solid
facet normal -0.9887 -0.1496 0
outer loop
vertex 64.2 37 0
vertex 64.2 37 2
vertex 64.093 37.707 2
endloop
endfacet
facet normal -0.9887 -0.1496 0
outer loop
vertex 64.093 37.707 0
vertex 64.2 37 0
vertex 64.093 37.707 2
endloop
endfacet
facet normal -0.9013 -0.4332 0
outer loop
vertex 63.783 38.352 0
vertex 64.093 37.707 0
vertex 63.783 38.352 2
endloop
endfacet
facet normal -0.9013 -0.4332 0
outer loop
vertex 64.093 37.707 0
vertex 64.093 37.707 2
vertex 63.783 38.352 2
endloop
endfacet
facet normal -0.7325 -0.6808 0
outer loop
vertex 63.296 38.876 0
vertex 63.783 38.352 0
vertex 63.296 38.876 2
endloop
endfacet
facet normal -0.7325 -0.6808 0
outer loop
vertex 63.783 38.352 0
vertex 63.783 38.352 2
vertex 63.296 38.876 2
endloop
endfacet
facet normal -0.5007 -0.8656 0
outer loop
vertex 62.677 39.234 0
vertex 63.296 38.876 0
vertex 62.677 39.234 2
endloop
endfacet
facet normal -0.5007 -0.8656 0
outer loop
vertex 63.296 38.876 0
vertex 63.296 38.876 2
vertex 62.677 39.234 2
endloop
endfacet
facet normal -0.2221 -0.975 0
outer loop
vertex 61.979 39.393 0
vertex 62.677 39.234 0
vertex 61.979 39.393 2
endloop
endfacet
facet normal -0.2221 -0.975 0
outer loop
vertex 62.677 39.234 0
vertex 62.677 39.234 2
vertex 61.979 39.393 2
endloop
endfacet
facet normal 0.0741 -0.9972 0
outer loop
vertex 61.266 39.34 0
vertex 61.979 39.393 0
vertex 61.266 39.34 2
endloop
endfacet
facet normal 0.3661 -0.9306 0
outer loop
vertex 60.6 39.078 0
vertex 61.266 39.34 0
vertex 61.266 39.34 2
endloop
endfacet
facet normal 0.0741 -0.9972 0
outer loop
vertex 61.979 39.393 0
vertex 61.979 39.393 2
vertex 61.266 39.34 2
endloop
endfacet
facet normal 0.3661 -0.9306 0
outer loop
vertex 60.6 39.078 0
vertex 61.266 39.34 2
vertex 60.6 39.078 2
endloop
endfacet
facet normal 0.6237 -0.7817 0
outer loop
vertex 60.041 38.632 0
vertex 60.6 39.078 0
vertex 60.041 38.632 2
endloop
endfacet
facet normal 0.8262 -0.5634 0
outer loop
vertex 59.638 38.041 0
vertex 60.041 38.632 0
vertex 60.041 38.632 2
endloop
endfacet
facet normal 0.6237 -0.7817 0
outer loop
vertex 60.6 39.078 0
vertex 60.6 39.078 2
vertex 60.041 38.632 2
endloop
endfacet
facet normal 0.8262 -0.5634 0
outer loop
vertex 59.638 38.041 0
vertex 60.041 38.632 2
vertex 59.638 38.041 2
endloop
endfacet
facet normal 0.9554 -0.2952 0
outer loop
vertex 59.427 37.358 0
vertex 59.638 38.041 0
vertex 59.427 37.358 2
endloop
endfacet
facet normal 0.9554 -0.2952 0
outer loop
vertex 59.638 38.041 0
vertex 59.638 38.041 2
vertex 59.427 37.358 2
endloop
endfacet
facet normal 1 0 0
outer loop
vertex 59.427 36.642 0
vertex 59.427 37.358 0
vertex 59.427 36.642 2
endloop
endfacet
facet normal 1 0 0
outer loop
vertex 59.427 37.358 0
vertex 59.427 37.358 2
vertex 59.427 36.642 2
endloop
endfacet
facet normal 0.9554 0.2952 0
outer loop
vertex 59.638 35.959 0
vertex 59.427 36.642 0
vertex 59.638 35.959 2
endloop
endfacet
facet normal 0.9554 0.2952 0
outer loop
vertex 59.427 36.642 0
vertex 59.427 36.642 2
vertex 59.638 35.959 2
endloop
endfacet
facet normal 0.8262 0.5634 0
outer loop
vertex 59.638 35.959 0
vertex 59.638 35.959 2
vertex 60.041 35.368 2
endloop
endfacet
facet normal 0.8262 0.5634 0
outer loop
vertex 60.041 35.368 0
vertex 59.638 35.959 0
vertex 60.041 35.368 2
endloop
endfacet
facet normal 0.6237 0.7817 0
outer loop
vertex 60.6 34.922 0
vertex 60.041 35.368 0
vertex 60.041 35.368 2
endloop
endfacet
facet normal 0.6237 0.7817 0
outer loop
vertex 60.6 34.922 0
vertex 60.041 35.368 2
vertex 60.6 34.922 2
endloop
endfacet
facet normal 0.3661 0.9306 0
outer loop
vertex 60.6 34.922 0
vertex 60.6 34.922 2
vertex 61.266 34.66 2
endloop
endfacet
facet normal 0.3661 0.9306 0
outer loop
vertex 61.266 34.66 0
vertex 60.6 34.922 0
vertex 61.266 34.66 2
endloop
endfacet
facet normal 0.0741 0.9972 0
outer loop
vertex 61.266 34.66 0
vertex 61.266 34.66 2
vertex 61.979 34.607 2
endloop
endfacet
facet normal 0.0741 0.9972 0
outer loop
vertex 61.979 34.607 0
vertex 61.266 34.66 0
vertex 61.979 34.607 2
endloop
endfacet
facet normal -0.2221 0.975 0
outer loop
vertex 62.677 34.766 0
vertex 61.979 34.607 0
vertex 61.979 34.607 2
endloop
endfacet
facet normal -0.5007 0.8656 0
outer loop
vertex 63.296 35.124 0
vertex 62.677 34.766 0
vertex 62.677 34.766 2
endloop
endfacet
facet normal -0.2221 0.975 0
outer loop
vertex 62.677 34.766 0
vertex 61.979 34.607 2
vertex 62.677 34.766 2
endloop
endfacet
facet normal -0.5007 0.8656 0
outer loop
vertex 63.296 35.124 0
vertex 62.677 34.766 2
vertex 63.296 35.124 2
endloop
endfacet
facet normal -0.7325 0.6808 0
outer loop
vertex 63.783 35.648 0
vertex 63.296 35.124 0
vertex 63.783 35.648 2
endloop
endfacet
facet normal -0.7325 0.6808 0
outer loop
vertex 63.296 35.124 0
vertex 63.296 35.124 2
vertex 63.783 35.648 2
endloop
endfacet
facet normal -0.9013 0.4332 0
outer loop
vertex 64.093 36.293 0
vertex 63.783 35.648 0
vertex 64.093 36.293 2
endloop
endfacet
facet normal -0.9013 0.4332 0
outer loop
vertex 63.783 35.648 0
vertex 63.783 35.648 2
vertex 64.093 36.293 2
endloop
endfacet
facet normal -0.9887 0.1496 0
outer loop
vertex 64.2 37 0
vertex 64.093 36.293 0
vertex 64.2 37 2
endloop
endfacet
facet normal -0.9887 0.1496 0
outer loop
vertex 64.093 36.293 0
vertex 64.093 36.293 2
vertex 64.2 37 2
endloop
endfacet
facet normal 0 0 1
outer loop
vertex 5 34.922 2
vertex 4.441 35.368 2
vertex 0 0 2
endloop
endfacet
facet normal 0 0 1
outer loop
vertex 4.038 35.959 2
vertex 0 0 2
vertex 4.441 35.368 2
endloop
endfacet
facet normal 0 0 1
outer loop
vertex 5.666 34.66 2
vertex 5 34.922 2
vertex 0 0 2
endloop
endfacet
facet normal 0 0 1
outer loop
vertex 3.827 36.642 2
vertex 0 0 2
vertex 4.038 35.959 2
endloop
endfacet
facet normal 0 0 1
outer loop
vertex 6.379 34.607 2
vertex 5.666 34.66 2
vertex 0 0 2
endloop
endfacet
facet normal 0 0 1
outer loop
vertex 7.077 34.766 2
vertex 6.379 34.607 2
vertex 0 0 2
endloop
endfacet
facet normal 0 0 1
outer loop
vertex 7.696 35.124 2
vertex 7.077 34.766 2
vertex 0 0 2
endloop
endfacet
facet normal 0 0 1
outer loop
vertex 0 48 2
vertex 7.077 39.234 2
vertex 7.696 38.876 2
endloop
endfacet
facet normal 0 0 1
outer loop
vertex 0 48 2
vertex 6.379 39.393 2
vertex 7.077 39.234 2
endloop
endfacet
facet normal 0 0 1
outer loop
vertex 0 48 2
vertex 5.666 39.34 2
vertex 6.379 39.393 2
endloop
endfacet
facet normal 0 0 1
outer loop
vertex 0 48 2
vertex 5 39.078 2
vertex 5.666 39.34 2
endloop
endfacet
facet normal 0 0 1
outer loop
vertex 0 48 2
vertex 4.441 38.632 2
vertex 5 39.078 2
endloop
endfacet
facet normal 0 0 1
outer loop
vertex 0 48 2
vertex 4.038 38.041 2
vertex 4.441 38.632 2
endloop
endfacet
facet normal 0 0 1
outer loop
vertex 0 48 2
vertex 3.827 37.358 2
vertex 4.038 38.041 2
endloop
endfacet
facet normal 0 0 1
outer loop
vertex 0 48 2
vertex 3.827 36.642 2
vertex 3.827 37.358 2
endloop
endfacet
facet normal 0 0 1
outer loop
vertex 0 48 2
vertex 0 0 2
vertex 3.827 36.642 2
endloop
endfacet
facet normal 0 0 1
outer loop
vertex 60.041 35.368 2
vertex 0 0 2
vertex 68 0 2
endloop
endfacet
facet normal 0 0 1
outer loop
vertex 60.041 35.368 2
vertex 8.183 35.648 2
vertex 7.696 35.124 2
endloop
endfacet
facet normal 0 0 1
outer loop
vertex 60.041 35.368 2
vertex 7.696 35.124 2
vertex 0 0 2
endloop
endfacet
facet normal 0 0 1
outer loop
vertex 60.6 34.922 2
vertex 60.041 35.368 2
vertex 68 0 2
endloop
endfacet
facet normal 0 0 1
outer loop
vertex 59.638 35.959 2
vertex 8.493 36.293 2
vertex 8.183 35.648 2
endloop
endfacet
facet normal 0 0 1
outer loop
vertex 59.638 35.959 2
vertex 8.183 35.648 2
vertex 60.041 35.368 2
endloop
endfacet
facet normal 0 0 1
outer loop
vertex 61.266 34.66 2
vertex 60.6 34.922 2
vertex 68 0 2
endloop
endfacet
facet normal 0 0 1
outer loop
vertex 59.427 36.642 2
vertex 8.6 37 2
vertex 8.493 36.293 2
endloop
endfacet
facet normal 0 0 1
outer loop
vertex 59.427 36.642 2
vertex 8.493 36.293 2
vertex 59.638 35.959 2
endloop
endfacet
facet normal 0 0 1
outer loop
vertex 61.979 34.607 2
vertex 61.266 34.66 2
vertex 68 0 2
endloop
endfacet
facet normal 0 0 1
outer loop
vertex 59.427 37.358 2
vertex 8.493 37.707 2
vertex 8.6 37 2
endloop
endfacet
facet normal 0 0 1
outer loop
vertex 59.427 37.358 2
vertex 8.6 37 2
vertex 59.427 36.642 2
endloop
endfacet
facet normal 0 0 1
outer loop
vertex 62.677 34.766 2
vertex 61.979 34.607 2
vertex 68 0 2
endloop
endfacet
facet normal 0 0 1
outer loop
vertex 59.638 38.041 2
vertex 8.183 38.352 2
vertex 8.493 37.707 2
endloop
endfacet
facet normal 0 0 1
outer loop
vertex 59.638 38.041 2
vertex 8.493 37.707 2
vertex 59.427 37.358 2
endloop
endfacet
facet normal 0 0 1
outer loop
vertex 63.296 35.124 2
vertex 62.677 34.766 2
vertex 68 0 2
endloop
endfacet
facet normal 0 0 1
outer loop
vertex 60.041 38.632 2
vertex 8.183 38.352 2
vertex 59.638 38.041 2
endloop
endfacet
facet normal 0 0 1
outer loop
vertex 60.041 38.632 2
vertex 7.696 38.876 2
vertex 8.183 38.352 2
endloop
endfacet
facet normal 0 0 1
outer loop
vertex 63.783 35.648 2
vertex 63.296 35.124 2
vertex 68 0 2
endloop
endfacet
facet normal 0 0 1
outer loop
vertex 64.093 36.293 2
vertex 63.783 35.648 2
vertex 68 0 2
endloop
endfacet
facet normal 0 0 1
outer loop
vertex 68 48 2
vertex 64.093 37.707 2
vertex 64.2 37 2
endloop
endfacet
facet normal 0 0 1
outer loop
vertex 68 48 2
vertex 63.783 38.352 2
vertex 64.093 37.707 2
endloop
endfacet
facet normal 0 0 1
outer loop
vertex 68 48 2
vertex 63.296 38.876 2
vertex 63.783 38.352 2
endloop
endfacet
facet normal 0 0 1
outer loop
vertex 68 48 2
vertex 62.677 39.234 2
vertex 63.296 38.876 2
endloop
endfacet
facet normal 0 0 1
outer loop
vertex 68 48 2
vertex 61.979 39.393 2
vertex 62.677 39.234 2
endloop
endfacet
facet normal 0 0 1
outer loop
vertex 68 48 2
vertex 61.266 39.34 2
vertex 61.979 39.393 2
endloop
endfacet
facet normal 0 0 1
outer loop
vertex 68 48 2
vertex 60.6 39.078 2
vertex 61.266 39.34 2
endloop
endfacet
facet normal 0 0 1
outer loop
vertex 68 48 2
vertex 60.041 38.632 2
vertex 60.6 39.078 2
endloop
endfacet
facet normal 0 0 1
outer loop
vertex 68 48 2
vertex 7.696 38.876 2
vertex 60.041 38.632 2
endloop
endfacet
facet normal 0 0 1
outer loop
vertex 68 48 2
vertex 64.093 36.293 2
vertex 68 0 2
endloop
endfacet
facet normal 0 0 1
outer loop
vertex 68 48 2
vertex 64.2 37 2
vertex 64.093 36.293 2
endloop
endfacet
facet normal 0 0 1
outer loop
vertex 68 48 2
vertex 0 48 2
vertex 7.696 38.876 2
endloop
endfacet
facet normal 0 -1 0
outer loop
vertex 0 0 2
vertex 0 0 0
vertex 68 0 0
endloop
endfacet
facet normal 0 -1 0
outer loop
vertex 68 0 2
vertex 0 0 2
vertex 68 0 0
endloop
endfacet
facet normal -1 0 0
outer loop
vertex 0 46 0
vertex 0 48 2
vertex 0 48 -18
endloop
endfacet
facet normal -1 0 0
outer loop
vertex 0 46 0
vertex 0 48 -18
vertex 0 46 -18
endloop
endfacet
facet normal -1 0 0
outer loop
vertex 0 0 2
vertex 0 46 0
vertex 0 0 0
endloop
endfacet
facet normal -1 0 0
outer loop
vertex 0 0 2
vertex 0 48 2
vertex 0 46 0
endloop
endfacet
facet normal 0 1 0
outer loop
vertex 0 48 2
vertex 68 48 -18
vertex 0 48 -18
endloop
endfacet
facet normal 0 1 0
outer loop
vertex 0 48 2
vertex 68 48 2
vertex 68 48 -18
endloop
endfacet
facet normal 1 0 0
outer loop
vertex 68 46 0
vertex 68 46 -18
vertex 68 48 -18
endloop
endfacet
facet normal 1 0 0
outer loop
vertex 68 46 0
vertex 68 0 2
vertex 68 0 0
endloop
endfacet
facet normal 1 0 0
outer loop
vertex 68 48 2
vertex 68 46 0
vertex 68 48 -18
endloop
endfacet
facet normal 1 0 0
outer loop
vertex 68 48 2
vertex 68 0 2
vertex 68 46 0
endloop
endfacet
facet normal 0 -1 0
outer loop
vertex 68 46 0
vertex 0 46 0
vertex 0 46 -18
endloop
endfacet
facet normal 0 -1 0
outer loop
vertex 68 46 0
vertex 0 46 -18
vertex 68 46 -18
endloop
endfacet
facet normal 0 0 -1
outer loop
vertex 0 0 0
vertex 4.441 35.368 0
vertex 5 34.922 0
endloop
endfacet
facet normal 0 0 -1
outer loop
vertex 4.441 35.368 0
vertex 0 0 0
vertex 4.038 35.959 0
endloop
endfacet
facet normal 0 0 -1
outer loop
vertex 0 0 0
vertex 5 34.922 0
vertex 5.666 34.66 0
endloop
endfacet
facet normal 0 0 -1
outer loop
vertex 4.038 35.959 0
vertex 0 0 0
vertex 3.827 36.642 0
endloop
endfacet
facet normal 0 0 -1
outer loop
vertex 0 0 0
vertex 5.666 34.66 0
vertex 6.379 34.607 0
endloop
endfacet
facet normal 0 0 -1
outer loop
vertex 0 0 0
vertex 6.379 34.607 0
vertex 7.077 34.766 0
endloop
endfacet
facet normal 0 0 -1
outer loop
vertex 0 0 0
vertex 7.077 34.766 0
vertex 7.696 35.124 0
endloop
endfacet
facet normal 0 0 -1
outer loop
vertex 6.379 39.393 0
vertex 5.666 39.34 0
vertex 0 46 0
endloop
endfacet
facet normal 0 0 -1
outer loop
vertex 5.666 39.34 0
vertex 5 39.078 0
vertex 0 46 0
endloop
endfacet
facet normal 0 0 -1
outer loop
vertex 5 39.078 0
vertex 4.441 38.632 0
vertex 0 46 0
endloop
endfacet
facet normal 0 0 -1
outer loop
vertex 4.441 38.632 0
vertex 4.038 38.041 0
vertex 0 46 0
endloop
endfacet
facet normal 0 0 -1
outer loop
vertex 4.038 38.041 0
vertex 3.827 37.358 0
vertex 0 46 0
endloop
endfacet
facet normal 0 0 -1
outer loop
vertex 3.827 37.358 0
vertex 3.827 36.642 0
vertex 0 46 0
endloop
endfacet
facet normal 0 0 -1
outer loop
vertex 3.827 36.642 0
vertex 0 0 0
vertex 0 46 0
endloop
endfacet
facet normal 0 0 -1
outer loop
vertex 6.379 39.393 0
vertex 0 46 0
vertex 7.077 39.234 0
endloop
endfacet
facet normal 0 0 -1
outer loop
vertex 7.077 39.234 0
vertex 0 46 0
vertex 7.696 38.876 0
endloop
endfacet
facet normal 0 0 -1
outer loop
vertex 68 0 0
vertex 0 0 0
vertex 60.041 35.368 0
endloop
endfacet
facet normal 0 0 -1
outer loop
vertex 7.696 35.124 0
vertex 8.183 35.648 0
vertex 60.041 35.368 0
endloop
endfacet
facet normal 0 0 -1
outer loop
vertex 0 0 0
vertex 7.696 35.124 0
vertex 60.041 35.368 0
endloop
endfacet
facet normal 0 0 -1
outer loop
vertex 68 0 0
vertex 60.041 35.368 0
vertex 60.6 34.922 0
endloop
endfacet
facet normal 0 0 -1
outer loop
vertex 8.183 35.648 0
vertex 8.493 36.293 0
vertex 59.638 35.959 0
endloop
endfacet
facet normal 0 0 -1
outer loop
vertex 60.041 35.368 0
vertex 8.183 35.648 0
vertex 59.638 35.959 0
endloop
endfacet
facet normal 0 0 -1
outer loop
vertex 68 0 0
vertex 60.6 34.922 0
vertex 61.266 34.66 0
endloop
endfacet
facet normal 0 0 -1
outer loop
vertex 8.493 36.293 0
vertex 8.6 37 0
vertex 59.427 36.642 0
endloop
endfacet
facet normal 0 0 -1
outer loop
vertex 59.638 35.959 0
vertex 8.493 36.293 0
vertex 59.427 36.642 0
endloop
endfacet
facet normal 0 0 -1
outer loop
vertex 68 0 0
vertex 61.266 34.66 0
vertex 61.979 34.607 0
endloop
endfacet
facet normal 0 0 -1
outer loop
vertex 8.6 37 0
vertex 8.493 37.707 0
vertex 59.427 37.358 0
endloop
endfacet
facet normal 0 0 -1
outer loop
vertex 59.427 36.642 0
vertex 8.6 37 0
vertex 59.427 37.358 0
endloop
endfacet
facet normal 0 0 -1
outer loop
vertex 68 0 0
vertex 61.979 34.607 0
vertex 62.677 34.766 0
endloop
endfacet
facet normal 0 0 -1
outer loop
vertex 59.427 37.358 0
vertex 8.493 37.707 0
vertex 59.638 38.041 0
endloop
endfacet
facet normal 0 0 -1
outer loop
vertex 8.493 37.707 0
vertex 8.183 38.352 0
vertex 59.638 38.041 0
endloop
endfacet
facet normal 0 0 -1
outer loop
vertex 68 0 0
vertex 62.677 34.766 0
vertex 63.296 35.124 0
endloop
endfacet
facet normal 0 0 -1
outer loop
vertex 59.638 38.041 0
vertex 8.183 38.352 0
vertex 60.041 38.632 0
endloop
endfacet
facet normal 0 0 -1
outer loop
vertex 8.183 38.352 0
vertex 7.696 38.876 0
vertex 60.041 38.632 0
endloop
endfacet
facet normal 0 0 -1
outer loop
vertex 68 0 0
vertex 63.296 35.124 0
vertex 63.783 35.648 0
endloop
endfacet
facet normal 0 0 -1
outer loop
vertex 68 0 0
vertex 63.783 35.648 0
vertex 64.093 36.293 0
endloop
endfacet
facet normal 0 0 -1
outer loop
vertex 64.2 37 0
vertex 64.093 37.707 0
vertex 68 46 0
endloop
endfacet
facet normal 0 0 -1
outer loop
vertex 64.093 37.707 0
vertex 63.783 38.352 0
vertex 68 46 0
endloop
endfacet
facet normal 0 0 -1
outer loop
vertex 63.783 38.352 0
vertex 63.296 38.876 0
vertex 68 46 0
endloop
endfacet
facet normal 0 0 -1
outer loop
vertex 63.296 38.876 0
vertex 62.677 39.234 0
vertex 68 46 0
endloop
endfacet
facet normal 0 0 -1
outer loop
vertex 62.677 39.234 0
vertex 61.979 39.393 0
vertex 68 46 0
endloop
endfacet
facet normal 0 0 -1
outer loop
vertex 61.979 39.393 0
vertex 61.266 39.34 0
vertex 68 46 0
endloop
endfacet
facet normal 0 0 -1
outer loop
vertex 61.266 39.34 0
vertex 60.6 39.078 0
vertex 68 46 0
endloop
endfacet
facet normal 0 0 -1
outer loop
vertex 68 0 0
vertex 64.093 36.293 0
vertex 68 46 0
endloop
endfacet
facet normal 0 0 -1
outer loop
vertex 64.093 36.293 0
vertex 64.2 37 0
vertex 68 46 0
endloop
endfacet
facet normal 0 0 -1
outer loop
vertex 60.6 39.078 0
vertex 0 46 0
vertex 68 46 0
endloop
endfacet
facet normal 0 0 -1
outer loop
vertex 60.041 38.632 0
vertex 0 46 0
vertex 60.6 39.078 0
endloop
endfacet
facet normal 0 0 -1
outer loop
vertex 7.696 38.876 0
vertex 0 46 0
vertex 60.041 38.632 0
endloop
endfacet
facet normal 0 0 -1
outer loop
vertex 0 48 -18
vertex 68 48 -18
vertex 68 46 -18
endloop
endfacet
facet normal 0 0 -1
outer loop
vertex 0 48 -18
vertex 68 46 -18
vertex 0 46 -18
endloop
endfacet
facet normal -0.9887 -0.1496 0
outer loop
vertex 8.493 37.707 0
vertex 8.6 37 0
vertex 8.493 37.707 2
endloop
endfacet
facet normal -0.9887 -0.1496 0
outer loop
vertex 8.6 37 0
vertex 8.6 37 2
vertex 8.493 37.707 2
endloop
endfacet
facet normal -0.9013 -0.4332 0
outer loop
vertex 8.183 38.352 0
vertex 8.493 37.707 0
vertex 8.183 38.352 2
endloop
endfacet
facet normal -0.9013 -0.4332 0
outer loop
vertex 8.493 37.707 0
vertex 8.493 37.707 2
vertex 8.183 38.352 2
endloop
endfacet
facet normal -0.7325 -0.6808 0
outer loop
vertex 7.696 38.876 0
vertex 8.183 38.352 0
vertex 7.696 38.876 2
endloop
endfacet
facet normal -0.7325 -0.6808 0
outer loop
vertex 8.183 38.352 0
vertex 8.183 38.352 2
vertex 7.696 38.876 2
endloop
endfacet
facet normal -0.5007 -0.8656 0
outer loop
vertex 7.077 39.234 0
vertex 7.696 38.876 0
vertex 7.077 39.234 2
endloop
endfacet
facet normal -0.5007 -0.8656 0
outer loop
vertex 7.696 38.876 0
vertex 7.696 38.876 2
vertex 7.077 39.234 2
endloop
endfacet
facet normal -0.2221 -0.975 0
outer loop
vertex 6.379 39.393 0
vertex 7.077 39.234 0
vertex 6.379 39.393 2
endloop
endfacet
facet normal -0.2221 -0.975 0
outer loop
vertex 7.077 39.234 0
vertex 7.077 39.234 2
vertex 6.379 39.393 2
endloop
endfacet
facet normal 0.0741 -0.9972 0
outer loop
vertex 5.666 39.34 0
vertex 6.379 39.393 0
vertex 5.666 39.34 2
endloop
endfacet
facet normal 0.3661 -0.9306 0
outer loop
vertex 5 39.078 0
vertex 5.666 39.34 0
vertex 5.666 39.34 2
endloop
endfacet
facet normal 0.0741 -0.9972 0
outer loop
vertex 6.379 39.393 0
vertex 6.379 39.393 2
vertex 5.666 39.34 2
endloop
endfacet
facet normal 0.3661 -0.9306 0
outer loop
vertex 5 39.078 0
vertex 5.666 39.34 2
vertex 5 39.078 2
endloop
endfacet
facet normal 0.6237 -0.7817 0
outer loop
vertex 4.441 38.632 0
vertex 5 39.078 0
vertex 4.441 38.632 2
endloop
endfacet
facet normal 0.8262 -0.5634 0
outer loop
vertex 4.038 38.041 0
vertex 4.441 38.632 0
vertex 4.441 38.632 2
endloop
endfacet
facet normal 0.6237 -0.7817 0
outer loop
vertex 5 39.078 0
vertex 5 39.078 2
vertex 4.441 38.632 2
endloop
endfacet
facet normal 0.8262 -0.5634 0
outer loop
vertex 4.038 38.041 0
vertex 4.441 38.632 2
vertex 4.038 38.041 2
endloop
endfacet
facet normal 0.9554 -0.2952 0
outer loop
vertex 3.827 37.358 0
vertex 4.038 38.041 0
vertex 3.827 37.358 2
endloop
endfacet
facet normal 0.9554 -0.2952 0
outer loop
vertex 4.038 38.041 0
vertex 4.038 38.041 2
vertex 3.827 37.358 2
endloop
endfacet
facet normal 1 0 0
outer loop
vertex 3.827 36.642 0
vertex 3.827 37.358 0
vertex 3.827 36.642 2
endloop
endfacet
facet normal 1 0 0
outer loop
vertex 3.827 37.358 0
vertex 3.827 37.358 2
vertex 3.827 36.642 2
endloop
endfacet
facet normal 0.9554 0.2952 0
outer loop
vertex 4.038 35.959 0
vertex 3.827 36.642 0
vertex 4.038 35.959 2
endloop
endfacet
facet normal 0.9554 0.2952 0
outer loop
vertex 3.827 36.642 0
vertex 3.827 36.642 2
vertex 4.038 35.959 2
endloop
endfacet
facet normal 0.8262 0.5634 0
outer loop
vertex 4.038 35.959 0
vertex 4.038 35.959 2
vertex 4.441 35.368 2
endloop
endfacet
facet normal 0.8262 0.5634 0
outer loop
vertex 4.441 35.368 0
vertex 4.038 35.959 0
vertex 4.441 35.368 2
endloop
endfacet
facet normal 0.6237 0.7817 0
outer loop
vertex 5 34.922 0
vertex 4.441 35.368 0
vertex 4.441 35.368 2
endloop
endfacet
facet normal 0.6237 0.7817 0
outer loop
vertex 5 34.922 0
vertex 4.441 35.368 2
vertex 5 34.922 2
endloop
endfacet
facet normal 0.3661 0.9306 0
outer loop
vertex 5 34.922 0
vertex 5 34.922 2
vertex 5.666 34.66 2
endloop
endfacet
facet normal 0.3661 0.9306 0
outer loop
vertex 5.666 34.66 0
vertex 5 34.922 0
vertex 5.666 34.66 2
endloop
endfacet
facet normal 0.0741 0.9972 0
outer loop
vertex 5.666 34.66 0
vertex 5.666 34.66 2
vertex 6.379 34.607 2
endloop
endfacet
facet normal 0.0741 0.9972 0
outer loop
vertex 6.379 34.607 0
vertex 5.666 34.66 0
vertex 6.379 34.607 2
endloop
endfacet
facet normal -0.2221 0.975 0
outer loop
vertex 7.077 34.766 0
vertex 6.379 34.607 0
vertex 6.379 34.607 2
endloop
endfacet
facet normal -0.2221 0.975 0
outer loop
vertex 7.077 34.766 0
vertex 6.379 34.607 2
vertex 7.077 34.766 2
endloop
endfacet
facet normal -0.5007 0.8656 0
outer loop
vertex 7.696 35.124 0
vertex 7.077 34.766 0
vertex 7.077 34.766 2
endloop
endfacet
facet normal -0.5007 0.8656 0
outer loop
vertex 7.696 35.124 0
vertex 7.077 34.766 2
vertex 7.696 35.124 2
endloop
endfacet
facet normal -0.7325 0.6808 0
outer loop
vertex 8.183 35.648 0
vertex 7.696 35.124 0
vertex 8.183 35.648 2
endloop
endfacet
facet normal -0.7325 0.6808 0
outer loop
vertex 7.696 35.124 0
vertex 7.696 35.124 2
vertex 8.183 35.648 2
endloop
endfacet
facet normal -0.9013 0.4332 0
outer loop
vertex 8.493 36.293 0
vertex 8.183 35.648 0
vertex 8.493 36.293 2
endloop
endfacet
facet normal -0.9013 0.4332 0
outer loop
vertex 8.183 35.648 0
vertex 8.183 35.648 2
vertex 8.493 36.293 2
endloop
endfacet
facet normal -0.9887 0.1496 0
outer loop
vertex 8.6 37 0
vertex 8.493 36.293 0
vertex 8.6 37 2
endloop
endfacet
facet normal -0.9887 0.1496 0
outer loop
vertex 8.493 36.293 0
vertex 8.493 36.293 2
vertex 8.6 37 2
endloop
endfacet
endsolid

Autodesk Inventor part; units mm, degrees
ref_plane "YZ Plane" through (0, 0, 0) normal (1, 0, 0) x (0, 1, 0)
ref_plane "XZ Plane" through (0, 0, 0) normal (0, 1, 0) x (-1, 0, 0)
ref_plane "XY Plane" through (0, 0, 0) normal (0, 0, 1) x (1, 0, 0)
sketch "Sketch1" plane through (0, 0, 0) normal (0, 0, 1) x (1, 0, 0)
  line L0 (0, 0) -> (68, 0)
  line L1 (68, 0) -> (68, 48)
  line L2 (68, 48) -> (0, 48)
  line L3 (0, 48) -> (0, 0)
  dimension "d0" = 68
  dimension "d1" = 48
extrude "Extrusion1" add sketch "Sketch1" along normal blind 2
sketch "Sketch2" plane through (0, 0, 2) normal (0, 0, 1) x (1, 0, 0)
  circle A0 centre (6.2, 37) radius 2.4
  circle A1 centre (61.8, 37) radius 2.4
  line L0 (0, 0) -> (68, 0) projected
  line L1 (34, 0) -> (34, 48) construction
  line L2 (68, 48) -> (0, 48) projected
  dimension "d4" = 4.8
  dimension "d5" = 4.8
  dimension "d6" = 55.6
  dimension "d7" = 27.8
  dimension "d8" = 37
extrude "Extrusion2" cut sketch "Sketch2" against normal blind 2
sketch "Sketch3" plane through (0, 0, 0) normal (0, 0, -1) x (-1, 0, 0)
  line L0 (-68, 48) -> (0, 48)
  line L1 (0, 48) -> (0, 46)
  line L2 (0, 46) -> (-68, 46)
  line L3 (-68, 46) -> (-68, 48)
  line L4 (0, 0) -> (0, 2)
  line L5 (-68, 2) -> (-68, 0)
  dimension "d11" = 2
extrude "Extrusion3" add sketch "Sketch3" along normal blind 18
properties part number "MainsCover"
